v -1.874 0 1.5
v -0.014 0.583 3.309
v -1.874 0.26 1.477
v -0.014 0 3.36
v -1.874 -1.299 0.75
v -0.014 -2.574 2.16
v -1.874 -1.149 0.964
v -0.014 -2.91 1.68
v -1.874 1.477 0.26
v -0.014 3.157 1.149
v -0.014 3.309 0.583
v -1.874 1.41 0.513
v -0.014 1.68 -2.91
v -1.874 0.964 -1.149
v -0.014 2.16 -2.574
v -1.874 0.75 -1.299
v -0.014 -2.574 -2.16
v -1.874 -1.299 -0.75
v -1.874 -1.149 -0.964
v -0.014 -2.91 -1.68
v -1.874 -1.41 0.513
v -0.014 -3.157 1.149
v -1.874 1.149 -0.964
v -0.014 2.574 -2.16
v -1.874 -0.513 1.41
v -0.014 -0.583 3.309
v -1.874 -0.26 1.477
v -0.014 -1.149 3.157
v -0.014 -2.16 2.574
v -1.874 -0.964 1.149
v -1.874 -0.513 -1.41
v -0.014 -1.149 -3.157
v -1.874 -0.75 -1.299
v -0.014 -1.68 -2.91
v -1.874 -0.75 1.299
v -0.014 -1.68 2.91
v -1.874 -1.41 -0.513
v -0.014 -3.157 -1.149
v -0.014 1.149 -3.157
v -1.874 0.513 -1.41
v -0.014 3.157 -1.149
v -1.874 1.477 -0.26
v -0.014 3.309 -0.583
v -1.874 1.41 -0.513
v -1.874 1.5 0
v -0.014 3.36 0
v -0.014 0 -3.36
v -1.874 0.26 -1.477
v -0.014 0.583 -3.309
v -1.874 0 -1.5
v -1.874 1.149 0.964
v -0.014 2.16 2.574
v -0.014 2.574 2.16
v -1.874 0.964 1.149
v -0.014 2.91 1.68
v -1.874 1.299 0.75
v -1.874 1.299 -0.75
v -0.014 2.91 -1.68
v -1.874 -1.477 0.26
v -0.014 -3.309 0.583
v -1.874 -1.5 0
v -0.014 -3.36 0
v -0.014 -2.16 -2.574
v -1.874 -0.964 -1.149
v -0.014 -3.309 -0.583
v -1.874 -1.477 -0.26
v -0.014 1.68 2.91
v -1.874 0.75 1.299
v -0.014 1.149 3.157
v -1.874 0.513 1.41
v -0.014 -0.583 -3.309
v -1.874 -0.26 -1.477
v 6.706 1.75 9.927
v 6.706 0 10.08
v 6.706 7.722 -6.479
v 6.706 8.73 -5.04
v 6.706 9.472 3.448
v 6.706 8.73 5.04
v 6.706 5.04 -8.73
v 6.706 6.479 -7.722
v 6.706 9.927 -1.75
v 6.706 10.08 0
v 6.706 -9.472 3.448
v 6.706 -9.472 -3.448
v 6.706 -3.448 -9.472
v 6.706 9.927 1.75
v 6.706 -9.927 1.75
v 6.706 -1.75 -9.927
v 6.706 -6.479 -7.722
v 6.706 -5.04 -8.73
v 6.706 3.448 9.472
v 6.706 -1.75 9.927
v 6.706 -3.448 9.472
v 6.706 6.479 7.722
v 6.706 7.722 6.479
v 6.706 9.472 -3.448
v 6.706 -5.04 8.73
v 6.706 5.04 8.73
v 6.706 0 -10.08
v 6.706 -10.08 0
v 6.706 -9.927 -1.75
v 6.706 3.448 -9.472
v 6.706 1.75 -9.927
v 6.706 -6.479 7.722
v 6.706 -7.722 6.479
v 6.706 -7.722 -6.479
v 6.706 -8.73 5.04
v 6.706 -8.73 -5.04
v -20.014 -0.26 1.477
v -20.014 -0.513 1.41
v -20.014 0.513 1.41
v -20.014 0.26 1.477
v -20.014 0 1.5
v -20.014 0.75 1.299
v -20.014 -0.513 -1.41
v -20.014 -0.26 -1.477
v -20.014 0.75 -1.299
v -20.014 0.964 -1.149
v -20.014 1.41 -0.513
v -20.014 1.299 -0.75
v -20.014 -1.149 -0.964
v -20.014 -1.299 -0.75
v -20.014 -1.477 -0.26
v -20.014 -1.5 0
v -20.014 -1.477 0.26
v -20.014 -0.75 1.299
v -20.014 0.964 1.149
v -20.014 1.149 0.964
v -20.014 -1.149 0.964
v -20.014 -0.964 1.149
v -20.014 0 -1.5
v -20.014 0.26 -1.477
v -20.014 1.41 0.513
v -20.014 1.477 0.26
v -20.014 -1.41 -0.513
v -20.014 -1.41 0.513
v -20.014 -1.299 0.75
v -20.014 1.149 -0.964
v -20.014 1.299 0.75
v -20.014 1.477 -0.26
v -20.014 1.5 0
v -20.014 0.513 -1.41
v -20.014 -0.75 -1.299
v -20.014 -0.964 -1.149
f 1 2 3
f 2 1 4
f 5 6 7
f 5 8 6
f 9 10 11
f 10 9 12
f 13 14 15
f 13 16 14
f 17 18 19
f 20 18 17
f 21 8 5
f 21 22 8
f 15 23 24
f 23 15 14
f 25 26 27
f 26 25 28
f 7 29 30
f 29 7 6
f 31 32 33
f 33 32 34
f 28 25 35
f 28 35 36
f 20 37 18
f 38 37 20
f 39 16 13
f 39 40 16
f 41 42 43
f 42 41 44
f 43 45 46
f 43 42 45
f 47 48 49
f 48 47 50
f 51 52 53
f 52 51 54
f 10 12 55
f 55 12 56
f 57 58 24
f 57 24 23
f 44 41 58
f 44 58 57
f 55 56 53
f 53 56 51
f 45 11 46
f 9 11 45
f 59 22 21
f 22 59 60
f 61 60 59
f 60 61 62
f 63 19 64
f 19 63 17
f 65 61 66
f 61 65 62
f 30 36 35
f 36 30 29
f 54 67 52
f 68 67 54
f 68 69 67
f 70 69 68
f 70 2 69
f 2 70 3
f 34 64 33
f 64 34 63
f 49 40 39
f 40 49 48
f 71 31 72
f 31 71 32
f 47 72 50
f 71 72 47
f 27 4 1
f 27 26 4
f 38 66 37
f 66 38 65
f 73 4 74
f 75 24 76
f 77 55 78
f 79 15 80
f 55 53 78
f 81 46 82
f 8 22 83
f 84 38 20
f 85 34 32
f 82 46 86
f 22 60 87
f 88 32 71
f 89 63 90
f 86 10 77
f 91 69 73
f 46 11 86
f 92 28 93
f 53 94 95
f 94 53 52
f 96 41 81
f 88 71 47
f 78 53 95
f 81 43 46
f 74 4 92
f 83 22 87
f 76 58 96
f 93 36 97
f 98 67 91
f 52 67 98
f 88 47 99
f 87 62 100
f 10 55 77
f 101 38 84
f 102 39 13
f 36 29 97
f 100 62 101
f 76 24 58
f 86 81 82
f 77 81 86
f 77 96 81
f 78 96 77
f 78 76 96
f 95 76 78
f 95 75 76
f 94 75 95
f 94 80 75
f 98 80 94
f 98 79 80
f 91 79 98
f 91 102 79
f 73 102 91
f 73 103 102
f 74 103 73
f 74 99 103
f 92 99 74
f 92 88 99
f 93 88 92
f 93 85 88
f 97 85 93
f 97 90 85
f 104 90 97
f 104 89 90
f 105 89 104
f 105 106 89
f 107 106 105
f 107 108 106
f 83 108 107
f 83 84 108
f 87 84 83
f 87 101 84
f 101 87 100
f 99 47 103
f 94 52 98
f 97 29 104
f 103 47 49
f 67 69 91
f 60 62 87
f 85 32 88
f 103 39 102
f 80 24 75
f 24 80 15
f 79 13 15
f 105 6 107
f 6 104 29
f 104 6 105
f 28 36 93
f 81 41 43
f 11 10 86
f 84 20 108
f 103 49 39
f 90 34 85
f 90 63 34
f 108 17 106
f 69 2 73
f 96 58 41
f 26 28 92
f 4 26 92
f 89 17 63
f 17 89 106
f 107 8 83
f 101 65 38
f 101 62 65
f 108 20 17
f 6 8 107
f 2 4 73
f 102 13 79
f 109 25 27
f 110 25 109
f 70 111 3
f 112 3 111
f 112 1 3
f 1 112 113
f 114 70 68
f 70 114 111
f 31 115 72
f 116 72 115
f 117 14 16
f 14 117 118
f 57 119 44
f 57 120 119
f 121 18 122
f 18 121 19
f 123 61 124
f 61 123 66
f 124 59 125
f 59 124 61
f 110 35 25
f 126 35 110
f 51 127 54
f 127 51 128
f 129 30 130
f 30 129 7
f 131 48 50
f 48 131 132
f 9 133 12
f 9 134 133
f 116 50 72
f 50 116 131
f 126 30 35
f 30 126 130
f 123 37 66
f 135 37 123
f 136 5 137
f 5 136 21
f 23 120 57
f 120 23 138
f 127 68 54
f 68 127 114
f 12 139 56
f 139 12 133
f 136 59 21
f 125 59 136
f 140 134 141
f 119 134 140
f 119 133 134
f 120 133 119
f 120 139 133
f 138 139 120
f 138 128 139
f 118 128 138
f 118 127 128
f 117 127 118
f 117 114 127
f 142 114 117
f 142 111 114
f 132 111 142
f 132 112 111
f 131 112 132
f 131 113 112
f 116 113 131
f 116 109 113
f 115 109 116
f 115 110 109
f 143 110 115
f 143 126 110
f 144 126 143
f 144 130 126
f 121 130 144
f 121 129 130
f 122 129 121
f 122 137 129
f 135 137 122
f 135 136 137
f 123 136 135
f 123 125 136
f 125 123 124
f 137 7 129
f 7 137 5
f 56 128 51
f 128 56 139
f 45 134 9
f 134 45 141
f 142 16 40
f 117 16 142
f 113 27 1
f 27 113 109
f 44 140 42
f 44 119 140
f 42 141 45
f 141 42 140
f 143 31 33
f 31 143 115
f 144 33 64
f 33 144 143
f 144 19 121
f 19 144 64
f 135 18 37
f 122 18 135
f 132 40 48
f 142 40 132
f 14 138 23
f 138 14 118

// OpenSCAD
p2p4flatD=3;
p2p4flatHA=90;
p2p4flatHD=6.72;  //listed as 6.72 max 5.54 min
p2p4flatHH=1.86;


c2ID=400;
//AP=(p2p4flatHD/2)
//PB=p2p4flatHD/2
//CD=c2ID

echo(
"CP",
((c2ID-sqrt((-4*(p2p4flatHD/2)*(p2p4flatHD/2))+((c2ID)*(c2ID))))/2)

);

p2p4flatORmax=((c2ID-sqrt((-4*(p2p4flatHD/2)*(p2p4flatHD/2))+((c2ID)*(c2ID))))/2)/2; //maximum radius to be within c2ID

rotate([0,270,0])
translate([0,0,p2p4flatORmax])
union(){
cylinder(d1=p2p4flatHD,d2=0,h=(p2p4flatHD/2)/tan(45),$fn=36);
translate([0,0,-(p2p4flatHD)/tan(45)])
cylinder(d1=p2p4flatHD*3,d2=p2p4flatHD,h=(p2p4flatHD)/tan(45),$fn=36);
cylinder(d=p2p4flatD,h=20,$fn=36);
}
translate([p2p4flatD/2,0,0])
cube(p2p4flatHH);
